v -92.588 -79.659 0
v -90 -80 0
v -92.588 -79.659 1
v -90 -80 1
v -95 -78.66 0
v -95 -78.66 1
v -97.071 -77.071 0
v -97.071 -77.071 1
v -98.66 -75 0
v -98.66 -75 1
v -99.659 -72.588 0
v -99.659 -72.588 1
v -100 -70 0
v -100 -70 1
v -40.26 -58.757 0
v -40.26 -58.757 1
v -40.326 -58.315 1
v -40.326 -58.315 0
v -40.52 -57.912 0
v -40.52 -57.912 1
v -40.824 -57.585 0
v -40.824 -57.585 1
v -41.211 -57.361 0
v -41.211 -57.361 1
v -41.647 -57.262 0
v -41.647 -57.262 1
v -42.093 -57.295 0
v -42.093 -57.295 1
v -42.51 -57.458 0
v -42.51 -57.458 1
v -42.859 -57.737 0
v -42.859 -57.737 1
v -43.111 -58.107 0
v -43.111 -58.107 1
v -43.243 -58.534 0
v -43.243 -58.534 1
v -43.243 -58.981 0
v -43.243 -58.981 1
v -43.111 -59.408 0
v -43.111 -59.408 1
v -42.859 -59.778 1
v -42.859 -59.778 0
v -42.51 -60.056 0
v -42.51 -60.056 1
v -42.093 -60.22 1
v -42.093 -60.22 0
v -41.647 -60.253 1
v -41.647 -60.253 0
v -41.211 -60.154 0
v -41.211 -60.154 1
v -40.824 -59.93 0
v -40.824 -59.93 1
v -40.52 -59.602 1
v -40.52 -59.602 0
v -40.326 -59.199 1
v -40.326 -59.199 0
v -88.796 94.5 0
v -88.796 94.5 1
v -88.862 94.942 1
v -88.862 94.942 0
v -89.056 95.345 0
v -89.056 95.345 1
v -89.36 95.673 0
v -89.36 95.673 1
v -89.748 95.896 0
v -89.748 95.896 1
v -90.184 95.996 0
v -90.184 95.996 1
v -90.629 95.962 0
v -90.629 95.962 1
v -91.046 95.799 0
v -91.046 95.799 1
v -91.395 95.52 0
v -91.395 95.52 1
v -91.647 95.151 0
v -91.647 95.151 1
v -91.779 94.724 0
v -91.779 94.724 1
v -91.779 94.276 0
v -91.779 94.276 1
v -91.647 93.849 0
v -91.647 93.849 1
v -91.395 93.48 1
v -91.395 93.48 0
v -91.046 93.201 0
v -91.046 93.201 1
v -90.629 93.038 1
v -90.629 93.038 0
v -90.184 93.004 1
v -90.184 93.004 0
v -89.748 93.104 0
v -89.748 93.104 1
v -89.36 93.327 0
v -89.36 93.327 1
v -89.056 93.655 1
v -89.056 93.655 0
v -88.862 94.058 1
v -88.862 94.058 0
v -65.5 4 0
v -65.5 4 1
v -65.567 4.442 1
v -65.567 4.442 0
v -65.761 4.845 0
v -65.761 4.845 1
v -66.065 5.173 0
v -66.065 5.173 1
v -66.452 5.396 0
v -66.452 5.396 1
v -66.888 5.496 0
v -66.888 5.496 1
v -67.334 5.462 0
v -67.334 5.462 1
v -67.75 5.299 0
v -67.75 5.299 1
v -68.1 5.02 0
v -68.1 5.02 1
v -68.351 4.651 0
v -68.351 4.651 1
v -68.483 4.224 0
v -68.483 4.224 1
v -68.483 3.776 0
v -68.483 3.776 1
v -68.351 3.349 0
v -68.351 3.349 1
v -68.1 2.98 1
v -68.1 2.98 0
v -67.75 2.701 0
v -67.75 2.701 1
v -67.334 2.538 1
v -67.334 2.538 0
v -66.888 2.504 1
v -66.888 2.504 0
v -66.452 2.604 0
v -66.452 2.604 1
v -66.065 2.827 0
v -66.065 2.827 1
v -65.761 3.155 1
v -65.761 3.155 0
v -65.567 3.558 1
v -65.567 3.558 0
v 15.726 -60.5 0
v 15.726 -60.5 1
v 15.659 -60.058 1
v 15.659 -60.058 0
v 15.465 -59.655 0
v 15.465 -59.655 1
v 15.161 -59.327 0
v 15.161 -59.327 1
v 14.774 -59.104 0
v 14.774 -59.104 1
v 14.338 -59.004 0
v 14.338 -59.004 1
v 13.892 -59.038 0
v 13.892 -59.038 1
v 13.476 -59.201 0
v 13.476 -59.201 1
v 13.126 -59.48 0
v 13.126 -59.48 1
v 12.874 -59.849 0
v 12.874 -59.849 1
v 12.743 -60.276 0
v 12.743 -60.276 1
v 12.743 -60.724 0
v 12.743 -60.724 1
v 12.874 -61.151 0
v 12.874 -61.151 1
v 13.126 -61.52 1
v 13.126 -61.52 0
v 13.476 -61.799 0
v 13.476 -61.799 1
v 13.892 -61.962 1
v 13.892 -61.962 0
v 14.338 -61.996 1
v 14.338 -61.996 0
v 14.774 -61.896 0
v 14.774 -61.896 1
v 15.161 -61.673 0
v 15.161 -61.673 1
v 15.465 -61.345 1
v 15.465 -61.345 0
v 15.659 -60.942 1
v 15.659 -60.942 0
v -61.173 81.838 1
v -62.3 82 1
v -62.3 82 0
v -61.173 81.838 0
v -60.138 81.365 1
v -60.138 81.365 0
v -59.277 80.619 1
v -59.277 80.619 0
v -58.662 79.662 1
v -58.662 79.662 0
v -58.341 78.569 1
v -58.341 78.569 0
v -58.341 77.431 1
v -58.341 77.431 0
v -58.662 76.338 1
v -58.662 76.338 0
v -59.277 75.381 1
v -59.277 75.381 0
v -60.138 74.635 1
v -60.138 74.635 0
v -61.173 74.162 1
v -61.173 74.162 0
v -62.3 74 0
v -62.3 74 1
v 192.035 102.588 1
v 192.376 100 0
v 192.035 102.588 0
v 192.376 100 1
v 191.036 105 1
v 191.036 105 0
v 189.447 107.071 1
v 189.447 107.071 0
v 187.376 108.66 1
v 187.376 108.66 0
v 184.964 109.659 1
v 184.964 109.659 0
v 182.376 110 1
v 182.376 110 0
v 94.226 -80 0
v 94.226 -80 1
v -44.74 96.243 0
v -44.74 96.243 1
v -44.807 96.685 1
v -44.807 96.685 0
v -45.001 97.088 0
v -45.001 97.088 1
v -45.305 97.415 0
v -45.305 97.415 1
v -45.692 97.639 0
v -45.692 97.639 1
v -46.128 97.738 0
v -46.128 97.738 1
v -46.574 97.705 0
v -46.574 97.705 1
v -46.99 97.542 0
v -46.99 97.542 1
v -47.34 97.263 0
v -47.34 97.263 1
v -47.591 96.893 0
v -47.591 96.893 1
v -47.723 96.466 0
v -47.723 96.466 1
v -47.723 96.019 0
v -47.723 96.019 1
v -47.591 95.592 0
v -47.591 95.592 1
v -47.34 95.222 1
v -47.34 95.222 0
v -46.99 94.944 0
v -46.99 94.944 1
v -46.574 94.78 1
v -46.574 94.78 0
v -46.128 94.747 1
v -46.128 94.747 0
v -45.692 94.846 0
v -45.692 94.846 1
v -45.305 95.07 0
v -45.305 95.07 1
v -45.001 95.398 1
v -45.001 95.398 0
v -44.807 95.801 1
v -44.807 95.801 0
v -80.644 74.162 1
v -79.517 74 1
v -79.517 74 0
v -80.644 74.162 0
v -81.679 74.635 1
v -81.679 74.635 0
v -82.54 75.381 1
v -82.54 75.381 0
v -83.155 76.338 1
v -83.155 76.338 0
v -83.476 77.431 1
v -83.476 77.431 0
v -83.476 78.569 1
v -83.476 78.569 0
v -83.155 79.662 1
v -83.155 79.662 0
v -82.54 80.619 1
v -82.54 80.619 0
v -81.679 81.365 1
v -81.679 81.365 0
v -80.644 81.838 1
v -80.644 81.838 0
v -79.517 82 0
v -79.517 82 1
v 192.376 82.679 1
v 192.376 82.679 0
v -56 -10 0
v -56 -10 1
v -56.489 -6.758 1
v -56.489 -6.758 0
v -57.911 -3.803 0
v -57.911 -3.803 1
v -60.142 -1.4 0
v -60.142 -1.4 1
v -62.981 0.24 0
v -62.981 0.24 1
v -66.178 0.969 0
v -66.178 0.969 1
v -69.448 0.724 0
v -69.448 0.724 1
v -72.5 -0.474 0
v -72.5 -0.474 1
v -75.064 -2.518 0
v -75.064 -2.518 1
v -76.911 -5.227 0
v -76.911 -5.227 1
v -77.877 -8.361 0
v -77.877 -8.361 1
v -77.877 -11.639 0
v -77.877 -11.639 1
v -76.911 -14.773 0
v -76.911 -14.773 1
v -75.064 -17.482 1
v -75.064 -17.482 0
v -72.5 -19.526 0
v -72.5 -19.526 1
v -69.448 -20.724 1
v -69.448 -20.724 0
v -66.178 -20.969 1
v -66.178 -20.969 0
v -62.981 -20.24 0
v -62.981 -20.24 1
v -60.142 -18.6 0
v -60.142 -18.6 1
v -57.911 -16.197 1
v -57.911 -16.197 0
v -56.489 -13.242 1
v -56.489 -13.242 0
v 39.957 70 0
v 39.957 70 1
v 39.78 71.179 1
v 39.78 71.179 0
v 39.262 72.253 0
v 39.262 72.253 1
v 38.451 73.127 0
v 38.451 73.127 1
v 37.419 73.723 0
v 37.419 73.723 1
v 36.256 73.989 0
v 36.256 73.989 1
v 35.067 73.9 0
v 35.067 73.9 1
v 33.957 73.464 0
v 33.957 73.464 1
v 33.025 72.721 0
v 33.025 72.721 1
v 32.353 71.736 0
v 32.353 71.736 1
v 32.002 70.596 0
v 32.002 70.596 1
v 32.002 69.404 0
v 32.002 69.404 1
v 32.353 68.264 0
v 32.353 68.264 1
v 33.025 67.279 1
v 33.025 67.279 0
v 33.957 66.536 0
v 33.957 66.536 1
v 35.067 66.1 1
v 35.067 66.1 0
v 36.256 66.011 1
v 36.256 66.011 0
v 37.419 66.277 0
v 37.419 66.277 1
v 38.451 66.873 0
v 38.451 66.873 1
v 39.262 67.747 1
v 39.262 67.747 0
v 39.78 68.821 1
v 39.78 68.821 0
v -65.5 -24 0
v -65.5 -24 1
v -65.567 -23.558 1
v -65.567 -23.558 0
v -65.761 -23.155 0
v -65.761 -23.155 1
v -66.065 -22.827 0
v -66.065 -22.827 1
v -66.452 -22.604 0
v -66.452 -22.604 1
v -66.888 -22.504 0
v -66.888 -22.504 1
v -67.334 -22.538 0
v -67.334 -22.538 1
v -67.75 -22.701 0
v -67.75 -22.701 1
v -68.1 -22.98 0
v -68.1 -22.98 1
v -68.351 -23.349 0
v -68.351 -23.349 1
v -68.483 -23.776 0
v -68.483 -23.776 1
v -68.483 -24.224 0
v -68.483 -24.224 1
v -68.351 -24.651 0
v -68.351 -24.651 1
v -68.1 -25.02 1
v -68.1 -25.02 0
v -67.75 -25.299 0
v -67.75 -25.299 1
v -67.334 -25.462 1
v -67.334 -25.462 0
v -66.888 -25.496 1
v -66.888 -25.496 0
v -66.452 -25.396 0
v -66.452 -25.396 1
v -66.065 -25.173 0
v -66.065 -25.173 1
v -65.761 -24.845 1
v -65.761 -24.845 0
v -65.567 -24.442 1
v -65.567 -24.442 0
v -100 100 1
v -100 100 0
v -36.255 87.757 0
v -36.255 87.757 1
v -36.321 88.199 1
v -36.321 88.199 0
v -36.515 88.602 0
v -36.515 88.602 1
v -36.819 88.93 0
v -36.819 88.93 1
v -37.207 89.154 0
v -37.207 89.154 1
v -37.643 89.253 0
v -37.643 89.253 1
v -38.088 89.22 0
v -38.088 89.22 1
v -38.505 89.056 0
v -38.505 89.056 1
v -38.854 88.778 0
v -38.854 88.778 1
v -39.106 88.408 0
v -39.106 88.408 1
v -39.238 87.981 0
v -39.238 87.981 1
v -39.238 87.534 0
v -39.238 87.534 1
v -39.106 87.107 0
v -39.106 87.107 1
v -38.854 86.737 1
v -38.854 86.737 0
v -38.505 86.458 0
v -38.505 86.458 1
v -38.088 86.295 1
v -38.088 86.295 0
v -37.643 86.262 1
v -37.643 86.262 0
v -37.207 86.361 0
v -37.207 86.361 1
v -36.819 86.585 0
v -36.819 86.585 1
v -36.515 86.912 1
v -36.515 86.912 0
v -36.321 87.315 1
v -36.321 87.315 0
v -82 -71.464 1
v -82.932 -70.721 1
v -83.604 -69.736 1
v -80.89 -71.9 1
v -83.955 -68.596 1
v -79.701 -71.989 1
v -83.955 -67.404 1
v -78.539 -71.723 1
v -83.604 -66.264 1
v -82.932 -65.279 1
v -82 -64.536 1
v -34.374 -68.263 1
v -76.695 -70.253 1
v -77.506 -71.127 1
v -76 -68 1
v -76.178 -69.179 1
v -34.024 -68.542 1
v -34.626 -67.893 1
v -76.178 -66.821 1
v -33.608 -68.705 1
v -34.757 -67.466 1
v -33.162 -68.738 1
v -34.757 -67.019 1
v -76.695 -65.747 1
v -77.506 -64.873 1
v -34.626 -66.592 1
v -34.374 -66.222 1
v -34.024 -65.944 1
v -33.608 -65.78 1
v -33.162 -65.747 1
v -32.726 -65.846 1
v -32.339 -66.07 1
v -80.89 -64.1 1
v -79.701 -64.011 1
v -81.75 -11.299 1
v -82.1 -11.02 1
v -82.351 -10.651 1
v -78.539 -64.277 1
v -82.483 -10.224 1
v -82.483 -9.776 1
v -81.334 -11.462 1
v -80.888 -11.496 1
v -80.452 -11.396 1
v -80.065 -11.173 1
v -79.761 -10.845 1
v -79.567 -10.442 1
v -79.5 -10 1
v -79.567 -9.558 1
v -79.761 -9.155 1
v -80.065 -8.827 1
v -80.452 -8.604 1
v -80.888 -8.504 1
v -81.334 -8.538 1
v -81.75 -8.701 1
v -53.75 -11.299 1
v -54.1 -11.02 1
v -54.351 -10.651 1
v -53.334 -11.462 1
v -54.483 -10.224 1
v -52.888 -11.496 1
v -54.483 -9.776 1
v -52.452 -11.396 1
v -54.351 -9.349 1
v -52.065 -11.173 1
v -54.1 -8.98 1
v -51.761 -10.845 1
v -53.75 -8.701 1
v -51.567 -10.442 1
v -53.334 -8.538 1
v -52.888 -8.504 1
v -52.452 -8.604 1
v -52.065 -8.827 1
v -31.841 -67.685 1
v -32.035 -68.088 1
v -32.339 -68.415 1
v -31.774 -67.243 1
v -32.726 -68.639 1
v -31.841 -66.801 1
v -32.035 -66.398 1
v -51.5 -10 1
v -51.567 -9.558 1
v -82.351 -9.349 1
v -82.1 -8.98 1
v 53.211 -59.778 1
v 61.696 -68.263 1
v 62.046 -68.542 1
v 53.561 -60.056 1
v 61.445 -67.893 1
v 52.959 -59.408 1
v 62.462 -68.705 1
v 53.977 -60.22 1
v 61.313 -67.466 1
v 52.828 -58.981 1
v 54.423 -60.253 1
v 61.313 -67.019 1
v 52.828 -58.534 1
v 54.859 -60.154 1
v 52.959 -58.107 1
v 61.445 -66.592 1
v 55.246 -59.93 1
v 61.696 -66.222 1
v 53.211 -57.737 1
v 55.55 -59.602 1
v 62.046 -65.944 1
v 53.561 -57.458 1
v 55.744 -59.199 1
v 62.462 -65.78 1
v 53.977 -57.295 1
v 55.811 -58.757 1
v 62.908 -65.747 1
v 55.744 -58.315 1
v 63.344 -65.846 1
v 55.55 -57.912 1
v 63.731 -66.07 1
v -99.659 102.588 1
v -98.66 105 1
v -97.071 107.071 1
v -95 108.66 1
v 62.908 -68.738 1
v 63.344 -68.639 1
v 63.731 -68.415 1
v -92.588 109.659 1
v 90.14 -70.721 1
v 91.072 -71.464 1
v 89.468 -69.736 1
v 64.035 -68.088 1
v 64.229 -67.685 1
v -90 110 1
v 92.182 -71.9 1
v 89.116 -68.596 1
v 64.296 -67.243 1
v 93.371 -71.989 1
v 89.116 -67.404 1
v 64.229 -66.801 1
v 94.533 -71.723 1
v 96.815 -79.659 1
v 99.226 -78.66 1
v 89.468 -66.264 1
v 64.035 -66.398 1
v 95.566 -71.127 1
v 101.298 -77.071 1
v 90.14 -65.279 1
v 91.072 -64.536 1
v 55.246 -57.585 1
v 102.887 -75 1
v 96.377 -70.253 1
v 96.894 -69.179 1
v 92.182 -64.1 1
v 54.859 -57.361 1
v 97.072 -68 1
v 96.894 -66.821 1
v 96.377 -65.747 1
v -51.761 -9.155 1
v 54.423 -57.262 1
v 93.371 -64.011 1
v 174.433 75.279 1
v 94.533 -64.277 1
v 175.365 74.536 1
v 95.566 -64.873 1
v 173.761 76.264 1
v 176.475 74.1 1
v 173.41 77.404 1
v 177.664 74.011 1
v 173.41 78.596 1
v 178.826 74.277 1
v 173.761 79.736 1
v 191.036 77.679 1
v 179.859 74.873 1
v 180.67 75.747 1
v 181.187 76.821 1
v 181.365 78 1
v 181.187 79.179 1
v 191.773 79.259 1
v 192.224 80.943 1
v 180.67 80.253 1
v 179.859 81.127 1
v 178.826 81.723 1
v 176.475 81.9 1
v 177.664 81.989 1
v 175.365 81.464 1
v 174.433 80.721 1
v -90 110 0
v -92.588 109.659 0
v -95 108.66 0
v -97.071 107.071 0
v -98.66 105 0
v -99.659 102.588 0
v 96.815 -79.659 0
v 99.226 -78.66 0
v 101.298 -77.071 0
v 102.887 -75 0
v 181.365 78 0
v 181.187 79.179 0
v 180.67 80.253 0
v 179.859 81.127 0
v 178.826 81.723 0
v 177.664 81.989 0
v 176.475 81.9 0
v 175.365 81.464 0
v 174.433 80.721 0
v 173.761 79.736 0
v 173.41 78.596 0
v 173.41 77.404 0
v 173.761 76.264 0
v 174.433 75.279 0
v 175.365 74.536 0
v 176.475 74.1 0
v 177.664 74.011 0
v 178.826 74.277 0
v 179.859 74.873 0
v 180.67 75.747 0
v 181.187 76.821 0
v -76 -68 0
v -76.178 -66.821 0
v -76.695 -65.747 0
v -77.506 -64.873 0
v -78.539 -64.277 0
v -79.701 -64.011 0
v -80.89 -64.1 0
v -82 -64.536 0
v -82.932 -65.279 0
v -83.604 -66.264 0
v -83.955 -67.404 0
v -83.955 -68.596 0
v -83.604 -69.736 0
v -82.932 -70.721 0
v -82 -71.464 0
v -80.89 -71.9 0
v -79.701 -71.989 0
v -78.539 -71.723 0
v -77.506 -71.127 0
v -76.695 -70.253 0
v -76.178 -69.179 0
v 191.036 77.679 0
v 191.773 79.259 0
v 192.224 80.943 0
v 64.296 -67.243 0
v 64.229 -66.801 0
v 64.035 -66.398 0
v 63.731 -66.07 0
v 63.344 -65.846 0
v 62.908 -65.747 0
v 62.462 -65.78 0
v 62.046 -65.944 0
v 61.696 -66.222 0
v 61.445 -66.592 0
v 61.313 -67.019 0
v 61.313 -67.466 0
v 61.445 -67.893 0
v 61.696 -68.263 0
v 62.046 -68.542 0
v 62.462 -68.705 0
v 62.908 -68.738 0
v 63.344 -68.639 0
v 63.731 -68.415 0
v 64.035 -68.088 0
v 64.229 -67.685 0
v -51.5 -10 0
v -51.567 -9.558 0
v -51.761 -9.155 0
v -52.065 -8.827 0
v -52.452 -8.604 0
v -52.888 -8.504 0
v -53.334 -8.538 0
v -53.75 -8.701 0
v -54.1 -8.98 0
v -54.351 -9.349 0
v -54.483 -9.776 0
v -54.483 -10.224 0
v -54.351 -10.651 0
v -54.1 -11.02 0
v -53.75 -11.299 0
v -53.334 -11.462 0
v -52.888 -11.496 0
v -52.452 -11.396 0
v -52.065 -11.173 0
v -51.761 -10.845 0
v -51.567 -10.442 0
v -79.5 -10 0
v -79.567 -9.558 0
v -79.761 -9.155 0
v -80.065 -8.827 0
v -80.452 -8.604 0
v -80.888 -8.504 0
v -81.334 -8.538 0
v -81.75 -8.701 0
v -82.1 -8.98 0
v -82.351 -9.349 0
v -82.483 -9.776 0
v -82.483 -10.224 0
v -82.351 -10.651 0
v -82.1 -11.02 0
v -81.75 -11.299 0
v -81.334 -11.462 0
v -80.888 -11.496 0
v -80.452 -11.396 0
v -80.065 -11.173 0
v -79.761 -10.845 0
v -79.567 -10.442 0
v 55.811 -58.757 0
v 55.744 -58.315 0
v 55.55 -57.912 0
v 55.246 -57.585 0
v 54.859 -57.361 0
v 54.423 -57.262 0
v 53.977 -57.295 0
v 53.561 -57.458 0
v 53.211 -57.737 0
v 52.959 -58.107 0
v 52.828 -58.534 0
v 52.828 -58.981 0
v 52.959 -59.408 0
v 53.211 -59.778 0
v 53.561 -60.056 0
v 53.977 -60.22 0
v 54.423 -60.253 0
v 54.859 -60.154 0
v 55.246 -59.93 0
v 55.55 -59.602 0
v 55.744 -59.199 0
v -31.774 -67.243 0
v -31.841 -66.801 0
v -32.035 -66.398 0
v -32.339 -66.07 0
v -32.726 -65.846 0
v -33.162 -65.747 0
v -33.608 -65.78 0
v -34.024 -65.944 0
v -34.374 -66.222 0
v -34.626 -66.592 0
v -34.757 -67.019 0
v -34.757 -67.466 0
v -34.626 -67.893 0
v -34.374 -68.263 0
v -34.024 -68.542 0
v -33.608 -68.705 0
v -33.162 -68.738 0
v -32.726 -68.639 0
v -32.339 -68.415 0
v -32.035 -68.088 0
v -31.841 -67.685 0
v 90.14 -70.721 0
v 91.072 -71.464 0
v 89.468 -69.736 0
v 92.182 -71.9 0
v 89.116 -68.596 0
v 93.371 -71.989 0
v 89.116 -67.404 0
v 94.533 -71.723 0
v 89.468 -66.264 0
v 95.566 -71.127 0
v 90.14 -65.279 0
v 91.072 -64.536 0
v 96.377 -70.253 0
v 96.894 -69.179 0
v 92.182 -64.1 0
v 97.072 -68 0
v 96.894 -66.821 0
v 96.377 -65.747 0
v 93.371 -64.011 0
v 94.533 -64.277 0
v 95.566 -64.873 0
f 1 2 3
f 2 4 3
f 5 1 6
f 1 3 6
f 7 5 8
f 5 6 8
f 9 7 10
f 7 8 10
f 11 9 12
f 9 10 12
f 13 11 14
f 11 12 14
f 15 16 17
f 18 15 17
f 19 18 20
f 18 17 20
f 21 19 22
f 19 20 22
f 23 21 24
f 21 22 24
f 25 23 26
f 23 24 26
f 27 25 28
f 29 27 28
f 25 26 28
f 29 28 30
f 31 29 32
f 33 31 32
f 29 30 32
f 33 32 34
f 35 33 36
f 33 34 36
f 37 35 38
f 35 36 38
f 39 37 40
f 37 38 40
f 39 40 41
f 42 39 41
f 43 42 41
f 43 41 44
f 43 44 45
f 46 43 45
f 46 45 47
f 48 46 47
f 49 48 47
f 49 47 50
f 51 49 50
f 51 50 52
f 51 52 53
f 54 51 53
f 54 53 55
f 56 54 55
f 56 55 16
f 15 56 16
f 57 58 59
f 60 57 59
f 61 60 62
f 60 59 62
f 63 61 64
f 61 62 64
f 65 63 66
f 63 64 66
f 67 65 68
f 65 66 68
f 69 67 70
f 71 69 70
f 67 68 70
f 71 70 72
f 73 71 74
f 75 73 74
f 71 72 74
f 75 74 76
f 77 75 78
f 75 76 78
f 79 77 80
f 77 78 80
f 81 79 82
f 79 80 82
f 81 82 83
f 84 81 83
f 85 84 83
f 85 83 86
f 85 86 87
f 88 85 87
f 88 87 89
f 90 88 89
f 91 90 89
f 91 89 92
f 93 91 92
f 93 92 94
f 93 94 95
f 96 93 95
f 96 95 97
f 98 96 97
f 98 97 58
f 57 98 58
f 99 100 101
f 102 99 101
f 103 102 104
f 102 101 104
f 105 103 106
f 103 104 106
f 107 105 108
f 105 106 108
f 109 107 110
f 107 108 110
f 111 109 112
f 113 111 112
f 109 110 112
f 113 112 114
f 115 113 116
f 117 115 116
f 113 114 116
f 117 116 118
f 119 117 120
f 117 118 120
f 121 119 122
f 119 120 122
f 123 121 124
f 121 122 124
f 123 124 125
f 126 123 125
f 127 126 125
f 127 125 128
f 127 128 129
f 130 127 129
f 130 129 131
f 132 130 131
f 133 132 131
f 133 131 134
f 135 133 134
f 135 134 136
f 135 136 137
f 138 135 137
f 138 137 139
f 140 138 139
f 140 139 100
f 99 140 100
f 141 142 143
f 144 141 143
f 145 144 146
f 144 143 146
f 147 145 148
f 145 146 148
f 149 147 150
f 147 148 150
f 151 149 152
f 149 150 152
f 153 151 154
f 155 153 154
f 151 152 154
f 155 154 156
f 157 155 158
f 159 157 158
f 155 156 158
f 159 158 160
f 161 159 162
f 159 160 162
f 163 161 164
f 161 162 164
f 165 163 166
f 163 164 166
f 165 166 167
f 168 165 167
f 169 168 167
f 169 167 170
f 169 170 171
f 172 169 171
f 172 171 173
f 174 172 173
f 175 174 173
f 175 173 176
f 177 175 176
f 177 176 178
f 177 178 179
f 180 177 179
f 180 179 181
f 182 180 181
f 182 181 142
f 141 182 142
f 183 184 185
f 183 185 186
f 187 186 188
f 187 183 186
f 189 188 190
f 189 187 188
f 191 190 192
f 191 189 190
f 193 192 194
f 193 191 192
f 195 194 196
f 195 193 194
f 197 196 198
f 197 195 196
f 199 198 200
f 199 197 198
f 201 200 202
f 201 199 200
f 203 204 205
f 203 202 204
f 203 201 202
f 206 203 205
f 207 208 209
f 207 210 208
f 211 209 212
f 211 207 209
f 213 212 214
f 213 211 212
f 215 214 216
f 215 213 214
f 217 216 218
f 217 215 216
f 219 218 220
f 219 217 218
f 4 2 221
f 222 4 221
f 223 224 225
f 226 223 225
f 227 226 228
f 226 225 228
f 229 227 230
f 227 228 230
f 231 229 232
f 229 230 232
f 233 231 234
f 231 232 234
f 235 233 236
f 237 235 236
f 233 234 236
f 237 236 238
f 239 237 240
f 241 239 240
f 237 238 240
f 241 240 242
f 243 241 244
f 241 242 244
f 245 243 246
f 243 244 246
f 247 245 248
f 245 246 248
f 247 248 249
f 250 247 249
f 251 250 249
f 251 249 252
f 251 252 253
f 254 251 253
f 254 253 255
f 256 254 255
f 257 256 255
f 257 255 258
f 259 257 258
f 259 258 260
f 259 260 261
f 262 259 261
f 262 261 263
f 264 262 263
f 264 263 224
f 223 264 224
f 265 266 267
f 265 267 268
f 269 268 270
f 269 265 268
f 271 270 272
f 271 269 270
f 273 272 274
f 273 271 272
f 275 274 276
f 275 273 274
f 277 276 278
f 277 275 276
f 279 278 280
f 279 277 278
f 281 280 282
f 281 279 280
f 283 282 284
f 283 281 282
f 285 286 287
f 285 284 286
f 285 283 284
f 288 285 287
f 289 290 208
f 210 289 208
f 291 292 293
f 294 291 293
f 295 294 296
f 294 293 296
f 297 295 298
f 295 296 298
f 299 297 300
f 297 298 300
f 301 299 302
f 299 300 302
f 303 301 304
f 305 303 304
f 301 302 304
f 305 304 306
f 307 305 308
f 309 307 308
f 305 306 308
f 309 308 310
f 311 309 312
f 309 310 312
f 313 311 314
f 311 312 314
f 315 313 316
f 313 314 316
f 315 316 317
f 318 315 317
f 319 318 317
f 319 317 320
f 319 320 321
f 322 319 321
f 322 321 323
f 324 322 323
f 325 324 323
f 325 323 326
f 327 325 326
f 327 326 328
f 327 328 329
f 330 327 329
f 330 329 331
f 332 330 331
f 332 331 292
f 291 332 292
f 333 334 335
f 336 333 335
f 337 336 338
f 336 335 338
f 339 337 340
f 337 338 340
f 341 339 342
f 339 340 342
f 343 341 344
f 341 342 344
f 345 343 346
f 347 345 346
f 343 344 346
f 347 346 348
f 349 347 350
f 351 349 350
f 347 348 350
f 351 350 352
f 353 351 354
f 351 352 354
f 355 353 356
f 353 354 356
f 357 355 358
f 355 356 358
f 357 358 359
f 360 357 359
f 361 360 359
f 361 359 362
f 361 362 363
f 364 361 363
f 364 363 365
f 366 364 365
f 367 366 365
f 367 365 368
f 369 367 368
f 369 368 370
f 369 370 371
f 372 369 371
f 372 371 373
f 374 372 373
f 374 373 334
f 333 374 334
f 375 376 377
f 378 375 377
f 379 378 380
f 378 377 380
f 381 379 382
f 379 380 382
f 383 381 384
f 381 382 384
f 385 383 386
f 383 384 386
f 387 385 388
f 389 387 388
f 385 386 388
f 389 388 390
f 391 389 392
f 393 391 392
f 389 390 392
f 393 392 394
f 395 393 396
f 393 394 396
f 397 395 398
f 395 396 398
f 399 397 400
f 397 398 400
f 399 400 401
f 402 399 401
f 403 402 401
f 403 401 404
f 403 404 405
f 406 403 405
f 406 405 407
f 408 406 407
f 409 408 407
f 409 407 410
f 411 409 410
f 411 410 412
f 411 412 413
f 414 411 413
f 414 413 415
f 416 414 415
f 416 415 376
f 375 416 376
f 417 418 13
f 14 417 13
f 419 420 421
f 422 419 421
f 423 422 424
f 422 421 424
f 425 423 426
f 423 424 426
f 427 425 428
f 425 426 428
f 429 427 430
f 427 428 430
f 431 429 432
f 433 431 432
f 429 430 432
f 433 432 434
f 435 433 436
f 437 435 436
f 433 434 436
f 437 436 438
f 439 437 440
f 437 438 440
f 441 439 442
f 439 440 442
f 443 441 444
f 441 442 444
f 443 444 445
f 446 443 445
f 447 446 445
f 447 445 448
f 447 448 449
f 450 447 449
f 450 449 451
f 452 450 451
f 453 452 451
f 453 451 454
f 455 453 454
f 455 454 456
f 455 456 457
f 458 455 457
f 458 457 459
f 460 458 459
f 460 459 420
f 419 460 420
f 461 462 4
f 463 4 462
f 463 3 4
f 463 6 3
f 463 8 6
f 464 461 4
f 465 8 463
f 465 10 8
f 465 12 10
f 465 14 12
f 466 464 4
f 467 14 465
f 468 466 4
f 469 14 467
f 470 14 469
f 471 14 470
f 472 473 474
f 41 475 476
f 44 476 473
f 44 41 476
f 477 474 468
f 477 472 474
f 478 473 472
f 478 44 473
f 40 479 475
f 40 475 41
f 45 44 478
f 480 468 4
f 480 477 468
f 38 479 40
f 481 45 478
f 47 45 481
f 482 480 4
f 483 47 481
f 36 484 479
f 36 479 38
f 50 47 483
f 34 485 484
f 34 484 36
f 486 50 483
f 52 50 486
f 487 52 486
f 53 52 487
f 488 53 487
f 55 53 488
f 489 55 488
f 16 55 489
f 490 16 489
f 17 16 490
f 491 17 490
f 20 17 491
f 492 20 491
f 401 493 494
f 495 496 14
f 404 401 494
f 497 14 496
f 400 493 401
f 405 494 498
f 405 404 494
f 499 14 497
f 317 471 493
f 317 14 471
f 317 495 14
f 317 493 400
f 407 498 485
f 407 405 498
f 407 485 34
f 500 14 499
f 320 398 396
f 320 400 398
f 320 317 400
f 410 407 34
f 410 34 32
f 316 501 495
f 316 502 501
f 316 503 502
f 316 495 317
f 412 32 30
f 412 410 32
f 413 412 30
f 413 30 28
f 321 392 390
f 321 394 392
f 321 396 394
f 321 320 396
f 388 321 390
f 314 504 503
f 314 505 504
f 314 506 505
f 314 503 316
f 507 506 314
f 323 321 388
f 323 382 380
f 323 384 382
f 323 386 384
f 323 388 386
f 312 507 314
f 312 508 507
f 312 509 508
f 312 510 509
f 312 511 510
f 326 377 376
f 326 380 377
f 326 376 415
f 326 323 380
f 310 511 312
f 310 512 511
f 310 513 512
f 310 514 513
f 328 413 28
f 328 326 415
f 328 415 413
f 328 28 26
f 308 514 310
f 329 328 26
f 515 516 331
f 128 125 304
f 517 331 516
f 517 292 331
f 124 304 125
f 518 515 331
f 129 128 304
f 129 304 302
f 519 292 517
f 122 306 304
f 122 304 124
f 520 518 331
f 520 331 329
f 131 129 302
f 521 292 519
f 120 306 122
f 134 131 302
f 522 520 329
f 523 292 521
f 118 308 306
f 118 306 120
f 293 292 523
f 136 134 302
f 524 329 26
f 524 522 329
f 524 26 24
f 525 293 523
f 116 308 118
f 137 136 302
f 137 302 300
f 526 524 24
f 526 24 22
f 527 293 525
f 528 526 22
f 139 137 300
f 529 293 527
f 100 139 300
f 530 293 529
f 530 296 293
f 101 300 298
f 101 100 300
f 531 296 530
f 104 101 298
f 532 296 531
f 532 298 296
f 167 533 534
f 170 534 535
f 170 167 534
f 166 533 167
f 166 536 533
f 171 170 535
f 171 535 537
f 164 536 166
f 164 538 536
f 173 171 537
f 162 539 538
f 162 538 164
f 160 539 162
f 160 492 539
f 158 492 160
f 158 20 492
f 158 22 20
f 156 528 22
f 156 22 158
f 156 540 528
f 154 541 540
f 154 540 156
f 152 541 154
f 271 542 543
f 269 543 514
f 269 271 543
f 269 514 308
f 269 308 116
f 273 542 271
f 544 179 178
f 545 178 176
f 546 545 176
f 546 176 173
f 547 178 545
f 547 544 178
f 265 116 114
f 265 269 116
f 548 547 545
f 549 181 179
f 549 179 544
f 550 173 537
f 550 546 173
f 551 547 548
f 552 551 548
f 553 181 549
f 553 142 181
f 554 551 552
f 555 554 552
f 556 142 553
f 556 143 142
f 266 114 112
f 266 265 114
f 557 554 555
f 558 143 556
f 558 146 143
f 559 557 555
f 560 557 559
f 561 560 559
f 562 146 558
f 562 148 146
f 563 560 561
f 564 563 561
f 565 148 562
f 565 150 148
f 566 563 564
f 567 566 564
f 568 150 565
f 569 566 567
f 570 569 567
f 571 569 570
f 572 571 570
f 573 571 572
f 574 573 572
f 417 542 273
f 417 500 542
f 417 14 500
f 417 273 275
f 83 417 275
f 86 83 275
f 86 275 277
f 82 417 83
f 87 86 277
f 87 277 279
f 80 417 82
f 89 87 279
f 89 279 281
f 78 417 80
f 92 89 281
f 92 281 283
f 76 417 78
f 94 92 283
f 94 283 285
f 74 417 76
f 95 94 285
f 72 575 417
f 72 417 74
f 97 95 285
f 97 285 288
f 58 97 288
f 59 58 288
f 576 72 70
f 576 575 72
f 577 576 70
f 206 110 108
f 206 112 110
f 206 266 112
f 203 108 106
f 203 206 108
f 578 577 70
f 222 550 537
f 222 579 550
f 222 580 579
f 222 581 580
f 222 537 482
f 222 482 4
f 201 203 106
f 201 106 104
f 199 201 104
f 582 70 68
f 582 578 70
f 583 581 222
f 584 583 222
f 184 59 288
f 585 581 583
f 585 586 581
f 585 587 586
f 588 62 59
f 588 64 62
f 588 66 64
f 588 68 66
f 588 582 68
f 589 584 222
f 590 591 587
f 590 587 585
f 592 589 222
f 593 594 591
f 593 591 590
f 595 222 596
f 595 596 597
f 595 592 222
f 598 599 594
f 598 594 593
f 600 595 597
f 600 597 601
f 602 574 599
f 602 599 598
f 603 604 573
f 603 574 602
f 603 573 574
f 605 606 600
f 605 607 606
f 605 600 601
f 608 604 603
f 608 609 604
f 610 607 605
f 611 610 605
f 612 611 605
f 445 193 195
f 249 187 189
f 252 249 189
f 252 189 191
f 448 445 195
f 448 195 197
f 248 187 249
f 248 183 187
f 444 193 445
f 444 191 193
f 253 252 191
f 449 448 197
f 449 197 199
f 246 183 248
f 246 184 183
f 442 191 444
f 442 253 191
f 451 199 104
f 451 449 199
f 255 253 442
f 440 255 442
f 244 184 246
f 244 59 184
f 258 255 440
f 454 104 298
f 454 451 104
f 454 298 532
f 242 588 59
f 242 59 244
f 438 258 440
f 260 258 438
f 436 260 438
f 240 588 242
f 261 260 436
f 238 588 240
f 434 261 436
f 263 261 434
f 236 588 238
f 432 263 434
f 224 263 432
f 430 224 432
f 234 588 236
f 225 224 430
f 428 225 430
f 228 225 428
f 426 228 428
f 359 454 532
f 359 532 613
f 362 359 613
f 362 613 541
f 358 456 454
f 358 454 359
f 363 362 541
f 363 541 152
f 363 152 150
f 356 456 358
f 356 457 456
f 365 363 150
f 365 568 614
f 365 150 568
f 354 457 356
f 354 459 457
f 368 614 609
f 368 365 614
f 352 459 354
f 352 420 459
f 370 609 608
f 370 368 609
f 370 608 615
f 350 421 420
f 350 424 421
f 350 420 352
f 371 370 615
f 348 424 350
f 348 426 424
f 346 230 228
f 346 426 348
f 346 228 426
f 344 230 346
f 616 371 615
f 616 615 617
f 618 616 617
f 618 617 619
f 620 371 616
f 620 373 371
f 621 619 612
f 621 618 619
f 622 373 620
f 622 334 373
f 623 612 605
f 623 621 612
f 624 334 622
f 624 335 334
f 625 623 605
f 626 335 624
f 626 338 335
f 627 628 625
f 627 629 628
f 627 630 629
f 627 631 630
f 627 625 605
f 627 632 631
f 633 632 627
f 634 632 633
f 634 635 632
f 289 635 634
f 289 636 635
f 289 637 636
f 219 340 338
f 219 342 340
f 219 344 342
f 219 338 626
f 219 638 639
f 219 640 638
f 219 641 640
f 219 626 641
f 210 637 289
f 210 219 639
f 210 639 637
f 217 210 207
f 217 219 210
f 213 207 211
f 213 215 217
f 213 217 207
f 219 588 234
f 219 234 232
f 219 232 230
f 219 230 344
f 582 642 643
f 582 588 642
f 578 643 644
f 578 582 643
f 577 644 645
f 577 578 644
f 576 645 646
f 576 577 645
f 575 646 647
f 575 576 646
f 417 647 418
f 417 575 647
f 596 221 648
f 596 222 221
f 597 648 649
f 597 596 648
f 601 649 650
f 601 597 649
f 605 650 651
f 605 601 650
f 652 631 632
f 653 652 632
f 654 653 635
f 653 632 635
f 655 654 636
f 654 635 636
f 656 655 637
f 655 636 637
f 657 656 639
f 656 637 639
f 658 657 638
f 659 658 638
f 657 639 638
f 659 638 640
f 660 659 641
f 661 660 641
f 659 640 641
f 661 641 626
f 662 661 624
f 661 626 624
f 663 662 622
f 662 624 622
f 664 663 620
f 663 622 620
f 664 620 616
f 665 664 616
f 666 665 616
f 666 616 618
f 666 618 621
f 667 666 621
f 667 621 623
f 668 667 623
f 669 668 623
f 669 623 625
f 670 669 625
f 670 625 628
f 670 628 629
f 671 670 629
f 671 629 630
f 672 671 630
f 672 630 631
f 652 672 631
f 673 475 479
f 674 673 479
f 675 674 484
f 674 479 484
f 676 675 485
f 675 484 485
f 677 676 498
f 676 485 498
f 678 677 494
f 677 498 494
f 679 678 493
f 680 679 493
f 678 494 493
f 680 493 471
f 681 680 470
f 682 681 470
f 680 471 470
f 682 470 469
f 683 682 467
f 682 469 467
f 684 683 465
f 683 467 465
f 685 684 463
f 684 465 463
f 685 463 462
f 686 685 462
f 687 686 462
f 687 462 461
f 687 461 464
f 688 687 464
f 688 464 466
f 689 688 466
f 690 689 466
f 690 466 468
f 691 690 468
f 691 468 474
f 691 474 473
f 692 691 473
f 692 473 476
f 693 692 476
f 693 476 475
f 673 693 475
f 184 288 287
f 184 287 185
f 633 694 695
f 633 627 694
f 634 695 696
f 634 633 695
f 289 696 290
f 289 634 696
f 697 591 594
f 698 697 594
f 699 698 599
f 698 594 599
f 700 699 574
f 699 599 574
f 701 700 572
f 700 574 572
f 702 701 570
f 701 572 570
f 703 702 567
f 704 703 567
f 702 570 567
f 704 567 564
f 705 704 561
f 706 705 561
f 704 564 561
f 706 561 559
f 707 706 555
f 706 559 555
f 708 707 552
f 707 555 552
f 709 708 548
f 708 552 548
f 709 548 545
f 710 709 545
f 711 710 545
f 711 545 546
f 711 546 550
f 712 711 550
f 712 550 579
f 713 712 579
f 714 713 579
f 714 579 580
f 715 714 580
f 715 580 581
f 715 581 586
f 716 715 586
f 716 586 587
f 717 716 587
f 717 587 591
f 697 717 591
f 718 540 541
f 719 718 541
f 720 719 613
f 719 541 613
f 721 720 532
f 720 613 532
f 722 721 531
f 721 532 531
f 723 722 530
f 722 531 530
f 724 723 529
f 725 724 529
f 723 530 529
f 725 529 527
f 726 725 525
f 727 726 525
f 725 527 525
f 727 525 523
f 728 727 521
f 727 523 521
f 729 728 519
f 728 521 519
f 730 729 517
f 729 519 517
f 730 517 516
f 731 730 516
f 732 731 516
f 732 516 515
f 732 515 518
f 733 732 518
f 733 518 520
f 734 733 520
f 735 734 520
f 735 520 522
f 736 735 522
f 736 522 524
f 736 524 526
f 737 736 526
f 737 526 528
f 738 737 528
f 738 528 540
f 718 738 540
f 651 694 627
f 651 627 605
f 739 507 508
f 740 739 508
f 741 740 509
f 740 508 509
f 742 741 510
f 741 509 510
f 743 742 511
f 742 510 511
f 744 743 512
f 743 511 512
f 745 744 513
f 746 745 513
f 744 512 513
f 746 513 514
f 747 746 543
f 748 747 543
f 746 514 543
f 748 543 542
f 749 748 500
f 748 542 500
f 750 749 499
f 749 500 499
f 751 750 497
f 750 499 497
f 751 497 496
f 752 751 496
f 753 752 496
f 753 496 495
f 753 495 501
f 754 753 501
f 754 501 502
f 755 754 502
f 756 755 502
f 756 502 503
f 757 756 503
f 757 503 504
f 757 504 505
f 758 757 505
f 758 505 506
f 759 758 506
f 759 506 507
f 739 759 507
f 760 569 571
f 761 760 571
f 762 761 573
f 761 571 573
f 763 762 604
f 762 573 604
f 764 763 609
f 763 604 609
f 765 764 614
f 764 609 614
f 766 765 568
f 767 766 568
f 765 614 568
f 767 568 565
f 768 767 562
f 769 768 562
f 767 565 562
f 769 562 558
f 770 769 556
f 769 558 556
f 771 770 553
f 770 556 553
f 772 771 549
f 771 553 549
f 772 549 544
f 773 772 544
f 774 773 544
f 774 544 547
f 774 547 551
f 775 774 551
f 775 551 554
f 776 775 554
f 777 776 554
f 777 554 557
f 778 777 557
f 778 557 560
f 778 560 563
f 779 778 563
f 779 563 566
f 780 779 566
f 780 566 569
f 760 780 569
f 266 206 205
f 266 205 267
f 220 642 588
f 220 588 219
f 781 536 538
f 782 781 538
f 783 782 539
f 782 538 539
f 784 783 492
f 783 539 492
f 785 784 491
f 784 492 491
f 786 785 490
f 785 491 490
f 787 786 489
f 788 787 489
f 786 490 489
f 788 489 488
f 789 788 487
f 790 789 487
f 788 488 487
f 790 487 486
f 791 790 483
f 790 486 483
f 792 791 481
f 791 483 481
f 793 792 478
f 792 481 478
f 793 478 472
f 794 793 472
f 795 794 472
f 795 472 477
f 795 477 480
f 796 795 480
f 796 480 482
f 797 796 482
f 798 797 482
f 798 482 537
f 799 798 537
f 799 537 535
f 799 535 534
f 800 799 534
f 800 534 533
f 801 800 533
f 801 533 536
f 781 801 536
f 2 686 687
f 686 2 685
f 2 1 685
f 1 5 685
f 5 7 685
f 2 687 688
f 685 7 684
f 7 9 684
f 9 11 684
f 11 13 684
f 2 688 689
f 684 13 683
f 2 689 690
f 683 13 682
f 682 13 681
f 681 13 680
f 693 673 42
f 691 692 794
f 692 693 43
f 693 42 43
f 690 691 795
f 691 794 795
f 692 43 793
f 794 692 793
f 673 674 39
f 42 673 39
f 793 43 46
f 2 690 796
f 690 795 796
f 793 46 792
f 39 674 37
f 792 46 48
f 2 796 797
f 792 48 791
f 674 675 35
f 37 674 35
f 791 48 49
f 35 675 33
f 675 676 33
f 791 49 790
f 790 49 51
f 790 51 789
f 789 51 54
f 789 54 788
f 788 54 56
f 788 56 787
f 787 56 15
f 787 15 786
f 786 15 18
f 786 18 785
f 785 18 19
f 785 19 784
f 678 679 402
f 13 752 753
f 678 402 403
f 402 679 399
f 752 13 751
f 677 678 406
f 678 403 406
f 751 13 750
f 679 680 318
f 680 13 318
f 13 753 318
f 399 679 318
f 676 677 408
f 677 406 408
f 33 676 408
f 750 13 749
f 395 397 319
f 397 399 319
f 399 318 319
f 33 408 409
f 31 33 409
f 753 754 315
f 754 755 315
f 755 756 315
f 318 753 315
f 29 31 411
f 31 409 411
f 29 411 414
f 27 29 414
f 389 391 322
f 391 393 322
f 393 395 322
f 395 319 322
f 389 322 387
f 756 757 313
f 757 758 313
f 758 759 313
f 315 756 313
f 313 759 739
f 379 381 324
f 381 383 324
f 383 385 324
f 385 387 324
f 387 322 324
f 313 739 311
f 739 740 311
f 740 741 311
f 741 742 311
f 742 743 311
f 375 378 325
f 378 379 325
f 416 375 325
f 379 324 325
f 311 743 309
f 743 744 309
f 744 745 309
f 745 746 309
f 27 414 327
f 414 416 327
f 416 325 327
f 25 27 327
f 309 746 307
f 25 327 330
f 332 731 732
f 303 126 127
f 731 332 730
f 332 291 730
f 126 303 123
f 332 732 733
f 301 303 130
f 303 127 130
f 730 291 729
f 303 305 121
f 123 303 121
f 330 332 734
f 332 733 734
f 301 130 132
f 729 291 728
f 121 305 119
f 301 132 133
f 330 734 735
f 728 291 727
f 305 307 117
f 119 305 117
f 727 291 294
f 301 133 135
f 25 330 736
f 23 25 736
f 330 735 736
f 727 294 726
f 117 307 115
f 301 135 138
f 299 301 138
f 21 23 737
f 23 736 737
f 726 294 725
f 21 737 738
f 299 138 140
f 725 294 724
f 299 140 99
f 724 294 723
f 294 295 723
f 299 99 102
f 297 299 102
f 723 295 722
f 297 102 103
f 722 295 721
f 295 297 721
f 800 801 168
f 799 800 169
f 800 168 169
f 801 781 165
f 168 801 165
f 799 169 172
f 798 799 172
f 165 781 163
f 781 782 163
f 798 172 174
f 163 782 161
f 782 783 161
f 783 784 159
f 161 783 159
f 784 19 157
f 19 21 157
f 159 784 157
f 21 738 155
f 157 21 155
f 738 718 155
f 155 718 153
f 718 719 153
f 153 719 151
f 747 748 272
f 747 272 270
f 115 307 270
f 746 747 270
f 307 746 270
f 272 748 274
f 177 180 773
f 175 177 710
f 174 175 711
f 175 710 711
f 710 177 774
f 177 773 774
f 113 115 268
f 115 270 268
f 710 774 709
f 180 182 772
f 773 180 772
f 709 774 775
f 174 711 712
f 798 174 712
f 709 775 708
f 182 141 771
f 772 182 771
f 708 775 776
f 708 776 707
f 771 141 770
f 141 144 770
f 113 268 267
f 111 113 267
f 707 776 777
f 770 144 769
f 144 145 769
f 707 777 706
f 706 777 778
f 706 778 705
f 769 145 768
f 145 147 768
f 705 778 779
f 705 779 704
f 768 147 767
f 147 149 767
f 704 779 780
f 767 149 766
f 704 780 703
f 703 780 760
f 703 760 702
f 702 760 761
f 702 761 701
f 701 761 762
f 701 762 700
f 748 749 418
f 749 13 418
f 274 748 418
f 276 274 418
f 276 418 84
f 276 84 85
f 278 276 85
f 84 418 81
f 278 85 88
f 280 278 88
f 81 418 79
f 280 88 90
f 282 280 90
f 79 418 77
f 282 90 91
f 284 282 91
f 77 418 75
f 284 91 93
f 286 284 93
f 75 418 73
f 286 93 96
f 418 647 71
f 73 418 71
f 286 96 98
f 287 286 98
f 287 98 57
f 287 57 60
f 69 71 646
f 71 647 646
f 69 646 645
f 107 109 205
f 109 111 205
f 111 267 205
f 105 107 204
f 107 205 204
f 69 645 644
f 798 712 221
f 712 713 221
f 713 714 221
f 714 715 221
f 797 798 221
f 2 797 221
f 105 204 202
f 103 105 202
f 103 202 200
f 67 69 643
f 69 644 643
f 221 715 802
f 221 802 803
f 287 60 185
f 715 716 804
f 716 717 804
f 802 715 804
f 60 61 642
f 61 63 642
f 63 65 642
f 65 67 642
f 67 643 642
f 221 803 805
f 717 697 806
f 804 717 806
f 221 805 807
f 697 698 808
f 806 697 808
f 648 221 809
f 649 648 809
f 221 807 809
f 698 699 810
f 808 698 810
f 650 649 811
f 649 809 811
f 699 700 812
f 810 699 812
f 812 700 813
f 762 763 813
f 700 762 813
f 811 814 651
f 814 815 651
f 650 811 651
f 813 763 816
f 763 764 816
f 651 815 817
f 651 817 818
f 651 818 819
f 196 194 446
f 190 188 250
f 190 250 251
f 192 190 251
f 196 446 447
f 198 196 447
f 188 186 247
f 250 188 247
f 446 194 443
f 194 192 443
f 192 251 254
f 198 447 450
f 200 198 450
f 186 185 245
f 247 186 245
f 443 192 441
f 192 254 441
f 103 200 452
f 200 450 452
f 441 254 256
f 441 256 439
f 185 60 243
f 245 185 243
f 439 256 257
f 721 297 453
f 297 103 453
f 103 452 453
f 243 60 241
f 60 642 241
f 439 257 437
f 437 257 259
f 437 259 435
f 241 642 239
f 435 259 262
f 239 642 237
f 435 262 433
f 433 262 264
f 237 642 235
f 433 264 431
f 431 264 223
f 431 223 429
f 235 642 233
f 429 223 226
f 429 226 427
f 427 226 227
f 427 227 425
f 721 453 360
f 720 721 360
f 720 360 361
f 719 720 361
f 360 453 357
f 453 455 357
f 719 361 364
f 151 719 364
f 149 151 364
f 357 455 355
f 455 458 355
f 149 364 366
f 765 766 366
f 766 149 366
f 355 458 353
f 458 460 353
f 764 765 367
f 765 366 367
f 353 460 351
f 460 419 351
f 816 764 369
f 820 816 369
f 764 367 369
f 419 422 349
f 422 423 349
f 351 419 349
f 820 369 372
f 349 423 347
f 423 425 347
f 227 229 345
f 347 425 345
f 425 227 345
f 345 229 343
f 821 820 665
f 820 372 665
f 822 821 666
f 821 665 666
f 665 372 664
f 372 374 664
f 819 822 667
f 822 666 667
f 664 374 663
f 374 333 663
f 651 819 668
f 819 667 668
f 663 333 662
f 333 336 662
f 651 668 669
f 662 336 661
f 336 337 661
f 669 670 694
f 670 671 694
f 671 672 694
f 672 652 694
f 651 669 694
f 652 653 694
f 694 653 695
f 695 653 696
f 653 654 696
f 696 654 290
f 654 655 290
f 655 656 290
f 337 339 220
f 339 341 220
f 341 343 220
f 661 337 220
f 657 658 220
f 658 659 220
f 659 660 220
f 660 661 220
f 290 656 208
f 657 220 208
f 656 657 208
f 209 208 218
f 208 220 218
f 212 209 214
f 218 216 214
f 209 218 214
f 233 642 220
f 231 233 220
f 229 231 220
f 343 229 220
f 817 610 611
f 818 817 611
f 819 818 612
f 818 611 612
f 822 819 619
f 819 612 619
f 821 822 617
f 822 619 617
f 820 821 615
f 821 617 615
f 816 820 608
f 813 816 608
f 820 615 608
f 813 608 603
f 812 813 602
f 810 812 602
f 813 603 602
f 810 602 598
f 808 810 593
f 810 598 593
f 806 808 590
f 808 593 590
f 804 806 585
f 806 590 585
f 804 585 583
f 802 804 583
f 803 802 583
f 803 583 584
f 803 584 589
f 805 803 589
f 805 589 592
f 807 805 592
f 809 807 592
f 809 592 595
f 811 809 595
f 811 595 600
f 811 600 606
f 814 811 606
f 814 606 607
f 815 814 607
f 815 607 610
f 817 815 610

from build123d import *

# Parameters (mm, degrees)
SKETCH1_W           = 200
SKETCH1_H           = 160
SKETCH1_W_2         = 292.37604307
SKETCH1_H_2         = 30
BOSS_EXTRUDE1_DEPTH = 1
FILLET1_R           = 10
SKETCH2_R           = 4
SKETCH2_R_2         = 11
SKETCH2_R_3         = 1.5
CUT_EXTRUDE1_DEPTH  = 3


with BuildPart() as part:
    # Sketch1 → Boss-Extrude1 (new body)
    with BuildSketch(Plane.XY):
        Rectangle(SKETCH1_W, SKETCH1_H)
        Polygon((192.37604307, 80), (100, -80), (100, 80), align=None)
        with Locations((46.188021535, 95)):
            Rectangle(SKETCH1_W_2, SKETCH1_H_2)
    extrude(amount=BOSS_EXTRUDE1_DEPTH)

    # Fillet1
    fillet1_edges = [part.edges().sort_by_distance(p)[0] for p in [
        (-100, 110, 0.5),
        (192.37604307, 110, 0.5),
        (-100, -80, 0.5),
        (192.37604307, 80, 0.5),
        (100, -80, 0.5),
    ]]
    fillet(fillet1_edges, radius=FILLET1_R)

    # Sketch2 → Cut-Extrude1 (cut)
    with BuildSketch(Plane.XY.offset(1)):
        with Locations((93.07179677, -68)):
            Circle(SKETCH2_R)
        with Locations((177.364936071, 78)):
            Circle(SKETCH2_R)
        with Locations((-67, -10)):
            Circle(SKETCH2_R_2)
        with Locations((-80, -68)):
            Circle(SKETCH2_R)
        with Locations((-53, -10)):
            Circle(SKETCH2_R_3)
        with Locations((-67, 4)):
            Circle(SKETCH2_R_3)
        with Locations((-81, -10)):
            Circle(SKETCH2_R_3)
        with Locations((-67, -24)):
            Circle(SKETCH2_R_3)
        with Locations((35.957265033, 70)):
            Circle(SKETCH2_R)
        with Locations((62.79605759, -67.242640687)):
            Circle(SKETCH2_R_3)
        with Locations((54.310776216, -58.757359313)):
            Circle(SKETCH2_R_3)
        with Locations((-33.274226936, -67.242640687)):
            Circle(SKETCH2_R_3)
        with Locations((-41.75950831, -58.757359313)):
            Circle(SKETCH2_R_3)
        with Locations((14.225855729, -60.5)):
            Circle(SKETCH2_R_3)
        with Locations((-37.754710439, 87.757359313)):
            Circle(SKETCH2_R_3)
        with Locations((-46.239991813, 96.242640687)):
            Circle(SKETCH2_R_3)
        with Locations((-90.295627115, 94.5)):
            Circle(SKETCH2_R_3)
        with BuildLine():
            Line((-79.516586773, 82), (-62.300333374, 82))
            ThreePointArc((-62.300333374, 82), (-58.300333374, 78), (-62.300333374, 74))
            Line((-62.300333374, 74), (-79.516586773, 74))
            ThreePointArc((-79.516586773, 74), (-83.516586773, 78), (-79.516586773, 82))
        make_face()
    extrude(amount=-CUT_EXTRUDE1_DEPTH, mode=Mode.SUBTRACT)


solid = part.part
